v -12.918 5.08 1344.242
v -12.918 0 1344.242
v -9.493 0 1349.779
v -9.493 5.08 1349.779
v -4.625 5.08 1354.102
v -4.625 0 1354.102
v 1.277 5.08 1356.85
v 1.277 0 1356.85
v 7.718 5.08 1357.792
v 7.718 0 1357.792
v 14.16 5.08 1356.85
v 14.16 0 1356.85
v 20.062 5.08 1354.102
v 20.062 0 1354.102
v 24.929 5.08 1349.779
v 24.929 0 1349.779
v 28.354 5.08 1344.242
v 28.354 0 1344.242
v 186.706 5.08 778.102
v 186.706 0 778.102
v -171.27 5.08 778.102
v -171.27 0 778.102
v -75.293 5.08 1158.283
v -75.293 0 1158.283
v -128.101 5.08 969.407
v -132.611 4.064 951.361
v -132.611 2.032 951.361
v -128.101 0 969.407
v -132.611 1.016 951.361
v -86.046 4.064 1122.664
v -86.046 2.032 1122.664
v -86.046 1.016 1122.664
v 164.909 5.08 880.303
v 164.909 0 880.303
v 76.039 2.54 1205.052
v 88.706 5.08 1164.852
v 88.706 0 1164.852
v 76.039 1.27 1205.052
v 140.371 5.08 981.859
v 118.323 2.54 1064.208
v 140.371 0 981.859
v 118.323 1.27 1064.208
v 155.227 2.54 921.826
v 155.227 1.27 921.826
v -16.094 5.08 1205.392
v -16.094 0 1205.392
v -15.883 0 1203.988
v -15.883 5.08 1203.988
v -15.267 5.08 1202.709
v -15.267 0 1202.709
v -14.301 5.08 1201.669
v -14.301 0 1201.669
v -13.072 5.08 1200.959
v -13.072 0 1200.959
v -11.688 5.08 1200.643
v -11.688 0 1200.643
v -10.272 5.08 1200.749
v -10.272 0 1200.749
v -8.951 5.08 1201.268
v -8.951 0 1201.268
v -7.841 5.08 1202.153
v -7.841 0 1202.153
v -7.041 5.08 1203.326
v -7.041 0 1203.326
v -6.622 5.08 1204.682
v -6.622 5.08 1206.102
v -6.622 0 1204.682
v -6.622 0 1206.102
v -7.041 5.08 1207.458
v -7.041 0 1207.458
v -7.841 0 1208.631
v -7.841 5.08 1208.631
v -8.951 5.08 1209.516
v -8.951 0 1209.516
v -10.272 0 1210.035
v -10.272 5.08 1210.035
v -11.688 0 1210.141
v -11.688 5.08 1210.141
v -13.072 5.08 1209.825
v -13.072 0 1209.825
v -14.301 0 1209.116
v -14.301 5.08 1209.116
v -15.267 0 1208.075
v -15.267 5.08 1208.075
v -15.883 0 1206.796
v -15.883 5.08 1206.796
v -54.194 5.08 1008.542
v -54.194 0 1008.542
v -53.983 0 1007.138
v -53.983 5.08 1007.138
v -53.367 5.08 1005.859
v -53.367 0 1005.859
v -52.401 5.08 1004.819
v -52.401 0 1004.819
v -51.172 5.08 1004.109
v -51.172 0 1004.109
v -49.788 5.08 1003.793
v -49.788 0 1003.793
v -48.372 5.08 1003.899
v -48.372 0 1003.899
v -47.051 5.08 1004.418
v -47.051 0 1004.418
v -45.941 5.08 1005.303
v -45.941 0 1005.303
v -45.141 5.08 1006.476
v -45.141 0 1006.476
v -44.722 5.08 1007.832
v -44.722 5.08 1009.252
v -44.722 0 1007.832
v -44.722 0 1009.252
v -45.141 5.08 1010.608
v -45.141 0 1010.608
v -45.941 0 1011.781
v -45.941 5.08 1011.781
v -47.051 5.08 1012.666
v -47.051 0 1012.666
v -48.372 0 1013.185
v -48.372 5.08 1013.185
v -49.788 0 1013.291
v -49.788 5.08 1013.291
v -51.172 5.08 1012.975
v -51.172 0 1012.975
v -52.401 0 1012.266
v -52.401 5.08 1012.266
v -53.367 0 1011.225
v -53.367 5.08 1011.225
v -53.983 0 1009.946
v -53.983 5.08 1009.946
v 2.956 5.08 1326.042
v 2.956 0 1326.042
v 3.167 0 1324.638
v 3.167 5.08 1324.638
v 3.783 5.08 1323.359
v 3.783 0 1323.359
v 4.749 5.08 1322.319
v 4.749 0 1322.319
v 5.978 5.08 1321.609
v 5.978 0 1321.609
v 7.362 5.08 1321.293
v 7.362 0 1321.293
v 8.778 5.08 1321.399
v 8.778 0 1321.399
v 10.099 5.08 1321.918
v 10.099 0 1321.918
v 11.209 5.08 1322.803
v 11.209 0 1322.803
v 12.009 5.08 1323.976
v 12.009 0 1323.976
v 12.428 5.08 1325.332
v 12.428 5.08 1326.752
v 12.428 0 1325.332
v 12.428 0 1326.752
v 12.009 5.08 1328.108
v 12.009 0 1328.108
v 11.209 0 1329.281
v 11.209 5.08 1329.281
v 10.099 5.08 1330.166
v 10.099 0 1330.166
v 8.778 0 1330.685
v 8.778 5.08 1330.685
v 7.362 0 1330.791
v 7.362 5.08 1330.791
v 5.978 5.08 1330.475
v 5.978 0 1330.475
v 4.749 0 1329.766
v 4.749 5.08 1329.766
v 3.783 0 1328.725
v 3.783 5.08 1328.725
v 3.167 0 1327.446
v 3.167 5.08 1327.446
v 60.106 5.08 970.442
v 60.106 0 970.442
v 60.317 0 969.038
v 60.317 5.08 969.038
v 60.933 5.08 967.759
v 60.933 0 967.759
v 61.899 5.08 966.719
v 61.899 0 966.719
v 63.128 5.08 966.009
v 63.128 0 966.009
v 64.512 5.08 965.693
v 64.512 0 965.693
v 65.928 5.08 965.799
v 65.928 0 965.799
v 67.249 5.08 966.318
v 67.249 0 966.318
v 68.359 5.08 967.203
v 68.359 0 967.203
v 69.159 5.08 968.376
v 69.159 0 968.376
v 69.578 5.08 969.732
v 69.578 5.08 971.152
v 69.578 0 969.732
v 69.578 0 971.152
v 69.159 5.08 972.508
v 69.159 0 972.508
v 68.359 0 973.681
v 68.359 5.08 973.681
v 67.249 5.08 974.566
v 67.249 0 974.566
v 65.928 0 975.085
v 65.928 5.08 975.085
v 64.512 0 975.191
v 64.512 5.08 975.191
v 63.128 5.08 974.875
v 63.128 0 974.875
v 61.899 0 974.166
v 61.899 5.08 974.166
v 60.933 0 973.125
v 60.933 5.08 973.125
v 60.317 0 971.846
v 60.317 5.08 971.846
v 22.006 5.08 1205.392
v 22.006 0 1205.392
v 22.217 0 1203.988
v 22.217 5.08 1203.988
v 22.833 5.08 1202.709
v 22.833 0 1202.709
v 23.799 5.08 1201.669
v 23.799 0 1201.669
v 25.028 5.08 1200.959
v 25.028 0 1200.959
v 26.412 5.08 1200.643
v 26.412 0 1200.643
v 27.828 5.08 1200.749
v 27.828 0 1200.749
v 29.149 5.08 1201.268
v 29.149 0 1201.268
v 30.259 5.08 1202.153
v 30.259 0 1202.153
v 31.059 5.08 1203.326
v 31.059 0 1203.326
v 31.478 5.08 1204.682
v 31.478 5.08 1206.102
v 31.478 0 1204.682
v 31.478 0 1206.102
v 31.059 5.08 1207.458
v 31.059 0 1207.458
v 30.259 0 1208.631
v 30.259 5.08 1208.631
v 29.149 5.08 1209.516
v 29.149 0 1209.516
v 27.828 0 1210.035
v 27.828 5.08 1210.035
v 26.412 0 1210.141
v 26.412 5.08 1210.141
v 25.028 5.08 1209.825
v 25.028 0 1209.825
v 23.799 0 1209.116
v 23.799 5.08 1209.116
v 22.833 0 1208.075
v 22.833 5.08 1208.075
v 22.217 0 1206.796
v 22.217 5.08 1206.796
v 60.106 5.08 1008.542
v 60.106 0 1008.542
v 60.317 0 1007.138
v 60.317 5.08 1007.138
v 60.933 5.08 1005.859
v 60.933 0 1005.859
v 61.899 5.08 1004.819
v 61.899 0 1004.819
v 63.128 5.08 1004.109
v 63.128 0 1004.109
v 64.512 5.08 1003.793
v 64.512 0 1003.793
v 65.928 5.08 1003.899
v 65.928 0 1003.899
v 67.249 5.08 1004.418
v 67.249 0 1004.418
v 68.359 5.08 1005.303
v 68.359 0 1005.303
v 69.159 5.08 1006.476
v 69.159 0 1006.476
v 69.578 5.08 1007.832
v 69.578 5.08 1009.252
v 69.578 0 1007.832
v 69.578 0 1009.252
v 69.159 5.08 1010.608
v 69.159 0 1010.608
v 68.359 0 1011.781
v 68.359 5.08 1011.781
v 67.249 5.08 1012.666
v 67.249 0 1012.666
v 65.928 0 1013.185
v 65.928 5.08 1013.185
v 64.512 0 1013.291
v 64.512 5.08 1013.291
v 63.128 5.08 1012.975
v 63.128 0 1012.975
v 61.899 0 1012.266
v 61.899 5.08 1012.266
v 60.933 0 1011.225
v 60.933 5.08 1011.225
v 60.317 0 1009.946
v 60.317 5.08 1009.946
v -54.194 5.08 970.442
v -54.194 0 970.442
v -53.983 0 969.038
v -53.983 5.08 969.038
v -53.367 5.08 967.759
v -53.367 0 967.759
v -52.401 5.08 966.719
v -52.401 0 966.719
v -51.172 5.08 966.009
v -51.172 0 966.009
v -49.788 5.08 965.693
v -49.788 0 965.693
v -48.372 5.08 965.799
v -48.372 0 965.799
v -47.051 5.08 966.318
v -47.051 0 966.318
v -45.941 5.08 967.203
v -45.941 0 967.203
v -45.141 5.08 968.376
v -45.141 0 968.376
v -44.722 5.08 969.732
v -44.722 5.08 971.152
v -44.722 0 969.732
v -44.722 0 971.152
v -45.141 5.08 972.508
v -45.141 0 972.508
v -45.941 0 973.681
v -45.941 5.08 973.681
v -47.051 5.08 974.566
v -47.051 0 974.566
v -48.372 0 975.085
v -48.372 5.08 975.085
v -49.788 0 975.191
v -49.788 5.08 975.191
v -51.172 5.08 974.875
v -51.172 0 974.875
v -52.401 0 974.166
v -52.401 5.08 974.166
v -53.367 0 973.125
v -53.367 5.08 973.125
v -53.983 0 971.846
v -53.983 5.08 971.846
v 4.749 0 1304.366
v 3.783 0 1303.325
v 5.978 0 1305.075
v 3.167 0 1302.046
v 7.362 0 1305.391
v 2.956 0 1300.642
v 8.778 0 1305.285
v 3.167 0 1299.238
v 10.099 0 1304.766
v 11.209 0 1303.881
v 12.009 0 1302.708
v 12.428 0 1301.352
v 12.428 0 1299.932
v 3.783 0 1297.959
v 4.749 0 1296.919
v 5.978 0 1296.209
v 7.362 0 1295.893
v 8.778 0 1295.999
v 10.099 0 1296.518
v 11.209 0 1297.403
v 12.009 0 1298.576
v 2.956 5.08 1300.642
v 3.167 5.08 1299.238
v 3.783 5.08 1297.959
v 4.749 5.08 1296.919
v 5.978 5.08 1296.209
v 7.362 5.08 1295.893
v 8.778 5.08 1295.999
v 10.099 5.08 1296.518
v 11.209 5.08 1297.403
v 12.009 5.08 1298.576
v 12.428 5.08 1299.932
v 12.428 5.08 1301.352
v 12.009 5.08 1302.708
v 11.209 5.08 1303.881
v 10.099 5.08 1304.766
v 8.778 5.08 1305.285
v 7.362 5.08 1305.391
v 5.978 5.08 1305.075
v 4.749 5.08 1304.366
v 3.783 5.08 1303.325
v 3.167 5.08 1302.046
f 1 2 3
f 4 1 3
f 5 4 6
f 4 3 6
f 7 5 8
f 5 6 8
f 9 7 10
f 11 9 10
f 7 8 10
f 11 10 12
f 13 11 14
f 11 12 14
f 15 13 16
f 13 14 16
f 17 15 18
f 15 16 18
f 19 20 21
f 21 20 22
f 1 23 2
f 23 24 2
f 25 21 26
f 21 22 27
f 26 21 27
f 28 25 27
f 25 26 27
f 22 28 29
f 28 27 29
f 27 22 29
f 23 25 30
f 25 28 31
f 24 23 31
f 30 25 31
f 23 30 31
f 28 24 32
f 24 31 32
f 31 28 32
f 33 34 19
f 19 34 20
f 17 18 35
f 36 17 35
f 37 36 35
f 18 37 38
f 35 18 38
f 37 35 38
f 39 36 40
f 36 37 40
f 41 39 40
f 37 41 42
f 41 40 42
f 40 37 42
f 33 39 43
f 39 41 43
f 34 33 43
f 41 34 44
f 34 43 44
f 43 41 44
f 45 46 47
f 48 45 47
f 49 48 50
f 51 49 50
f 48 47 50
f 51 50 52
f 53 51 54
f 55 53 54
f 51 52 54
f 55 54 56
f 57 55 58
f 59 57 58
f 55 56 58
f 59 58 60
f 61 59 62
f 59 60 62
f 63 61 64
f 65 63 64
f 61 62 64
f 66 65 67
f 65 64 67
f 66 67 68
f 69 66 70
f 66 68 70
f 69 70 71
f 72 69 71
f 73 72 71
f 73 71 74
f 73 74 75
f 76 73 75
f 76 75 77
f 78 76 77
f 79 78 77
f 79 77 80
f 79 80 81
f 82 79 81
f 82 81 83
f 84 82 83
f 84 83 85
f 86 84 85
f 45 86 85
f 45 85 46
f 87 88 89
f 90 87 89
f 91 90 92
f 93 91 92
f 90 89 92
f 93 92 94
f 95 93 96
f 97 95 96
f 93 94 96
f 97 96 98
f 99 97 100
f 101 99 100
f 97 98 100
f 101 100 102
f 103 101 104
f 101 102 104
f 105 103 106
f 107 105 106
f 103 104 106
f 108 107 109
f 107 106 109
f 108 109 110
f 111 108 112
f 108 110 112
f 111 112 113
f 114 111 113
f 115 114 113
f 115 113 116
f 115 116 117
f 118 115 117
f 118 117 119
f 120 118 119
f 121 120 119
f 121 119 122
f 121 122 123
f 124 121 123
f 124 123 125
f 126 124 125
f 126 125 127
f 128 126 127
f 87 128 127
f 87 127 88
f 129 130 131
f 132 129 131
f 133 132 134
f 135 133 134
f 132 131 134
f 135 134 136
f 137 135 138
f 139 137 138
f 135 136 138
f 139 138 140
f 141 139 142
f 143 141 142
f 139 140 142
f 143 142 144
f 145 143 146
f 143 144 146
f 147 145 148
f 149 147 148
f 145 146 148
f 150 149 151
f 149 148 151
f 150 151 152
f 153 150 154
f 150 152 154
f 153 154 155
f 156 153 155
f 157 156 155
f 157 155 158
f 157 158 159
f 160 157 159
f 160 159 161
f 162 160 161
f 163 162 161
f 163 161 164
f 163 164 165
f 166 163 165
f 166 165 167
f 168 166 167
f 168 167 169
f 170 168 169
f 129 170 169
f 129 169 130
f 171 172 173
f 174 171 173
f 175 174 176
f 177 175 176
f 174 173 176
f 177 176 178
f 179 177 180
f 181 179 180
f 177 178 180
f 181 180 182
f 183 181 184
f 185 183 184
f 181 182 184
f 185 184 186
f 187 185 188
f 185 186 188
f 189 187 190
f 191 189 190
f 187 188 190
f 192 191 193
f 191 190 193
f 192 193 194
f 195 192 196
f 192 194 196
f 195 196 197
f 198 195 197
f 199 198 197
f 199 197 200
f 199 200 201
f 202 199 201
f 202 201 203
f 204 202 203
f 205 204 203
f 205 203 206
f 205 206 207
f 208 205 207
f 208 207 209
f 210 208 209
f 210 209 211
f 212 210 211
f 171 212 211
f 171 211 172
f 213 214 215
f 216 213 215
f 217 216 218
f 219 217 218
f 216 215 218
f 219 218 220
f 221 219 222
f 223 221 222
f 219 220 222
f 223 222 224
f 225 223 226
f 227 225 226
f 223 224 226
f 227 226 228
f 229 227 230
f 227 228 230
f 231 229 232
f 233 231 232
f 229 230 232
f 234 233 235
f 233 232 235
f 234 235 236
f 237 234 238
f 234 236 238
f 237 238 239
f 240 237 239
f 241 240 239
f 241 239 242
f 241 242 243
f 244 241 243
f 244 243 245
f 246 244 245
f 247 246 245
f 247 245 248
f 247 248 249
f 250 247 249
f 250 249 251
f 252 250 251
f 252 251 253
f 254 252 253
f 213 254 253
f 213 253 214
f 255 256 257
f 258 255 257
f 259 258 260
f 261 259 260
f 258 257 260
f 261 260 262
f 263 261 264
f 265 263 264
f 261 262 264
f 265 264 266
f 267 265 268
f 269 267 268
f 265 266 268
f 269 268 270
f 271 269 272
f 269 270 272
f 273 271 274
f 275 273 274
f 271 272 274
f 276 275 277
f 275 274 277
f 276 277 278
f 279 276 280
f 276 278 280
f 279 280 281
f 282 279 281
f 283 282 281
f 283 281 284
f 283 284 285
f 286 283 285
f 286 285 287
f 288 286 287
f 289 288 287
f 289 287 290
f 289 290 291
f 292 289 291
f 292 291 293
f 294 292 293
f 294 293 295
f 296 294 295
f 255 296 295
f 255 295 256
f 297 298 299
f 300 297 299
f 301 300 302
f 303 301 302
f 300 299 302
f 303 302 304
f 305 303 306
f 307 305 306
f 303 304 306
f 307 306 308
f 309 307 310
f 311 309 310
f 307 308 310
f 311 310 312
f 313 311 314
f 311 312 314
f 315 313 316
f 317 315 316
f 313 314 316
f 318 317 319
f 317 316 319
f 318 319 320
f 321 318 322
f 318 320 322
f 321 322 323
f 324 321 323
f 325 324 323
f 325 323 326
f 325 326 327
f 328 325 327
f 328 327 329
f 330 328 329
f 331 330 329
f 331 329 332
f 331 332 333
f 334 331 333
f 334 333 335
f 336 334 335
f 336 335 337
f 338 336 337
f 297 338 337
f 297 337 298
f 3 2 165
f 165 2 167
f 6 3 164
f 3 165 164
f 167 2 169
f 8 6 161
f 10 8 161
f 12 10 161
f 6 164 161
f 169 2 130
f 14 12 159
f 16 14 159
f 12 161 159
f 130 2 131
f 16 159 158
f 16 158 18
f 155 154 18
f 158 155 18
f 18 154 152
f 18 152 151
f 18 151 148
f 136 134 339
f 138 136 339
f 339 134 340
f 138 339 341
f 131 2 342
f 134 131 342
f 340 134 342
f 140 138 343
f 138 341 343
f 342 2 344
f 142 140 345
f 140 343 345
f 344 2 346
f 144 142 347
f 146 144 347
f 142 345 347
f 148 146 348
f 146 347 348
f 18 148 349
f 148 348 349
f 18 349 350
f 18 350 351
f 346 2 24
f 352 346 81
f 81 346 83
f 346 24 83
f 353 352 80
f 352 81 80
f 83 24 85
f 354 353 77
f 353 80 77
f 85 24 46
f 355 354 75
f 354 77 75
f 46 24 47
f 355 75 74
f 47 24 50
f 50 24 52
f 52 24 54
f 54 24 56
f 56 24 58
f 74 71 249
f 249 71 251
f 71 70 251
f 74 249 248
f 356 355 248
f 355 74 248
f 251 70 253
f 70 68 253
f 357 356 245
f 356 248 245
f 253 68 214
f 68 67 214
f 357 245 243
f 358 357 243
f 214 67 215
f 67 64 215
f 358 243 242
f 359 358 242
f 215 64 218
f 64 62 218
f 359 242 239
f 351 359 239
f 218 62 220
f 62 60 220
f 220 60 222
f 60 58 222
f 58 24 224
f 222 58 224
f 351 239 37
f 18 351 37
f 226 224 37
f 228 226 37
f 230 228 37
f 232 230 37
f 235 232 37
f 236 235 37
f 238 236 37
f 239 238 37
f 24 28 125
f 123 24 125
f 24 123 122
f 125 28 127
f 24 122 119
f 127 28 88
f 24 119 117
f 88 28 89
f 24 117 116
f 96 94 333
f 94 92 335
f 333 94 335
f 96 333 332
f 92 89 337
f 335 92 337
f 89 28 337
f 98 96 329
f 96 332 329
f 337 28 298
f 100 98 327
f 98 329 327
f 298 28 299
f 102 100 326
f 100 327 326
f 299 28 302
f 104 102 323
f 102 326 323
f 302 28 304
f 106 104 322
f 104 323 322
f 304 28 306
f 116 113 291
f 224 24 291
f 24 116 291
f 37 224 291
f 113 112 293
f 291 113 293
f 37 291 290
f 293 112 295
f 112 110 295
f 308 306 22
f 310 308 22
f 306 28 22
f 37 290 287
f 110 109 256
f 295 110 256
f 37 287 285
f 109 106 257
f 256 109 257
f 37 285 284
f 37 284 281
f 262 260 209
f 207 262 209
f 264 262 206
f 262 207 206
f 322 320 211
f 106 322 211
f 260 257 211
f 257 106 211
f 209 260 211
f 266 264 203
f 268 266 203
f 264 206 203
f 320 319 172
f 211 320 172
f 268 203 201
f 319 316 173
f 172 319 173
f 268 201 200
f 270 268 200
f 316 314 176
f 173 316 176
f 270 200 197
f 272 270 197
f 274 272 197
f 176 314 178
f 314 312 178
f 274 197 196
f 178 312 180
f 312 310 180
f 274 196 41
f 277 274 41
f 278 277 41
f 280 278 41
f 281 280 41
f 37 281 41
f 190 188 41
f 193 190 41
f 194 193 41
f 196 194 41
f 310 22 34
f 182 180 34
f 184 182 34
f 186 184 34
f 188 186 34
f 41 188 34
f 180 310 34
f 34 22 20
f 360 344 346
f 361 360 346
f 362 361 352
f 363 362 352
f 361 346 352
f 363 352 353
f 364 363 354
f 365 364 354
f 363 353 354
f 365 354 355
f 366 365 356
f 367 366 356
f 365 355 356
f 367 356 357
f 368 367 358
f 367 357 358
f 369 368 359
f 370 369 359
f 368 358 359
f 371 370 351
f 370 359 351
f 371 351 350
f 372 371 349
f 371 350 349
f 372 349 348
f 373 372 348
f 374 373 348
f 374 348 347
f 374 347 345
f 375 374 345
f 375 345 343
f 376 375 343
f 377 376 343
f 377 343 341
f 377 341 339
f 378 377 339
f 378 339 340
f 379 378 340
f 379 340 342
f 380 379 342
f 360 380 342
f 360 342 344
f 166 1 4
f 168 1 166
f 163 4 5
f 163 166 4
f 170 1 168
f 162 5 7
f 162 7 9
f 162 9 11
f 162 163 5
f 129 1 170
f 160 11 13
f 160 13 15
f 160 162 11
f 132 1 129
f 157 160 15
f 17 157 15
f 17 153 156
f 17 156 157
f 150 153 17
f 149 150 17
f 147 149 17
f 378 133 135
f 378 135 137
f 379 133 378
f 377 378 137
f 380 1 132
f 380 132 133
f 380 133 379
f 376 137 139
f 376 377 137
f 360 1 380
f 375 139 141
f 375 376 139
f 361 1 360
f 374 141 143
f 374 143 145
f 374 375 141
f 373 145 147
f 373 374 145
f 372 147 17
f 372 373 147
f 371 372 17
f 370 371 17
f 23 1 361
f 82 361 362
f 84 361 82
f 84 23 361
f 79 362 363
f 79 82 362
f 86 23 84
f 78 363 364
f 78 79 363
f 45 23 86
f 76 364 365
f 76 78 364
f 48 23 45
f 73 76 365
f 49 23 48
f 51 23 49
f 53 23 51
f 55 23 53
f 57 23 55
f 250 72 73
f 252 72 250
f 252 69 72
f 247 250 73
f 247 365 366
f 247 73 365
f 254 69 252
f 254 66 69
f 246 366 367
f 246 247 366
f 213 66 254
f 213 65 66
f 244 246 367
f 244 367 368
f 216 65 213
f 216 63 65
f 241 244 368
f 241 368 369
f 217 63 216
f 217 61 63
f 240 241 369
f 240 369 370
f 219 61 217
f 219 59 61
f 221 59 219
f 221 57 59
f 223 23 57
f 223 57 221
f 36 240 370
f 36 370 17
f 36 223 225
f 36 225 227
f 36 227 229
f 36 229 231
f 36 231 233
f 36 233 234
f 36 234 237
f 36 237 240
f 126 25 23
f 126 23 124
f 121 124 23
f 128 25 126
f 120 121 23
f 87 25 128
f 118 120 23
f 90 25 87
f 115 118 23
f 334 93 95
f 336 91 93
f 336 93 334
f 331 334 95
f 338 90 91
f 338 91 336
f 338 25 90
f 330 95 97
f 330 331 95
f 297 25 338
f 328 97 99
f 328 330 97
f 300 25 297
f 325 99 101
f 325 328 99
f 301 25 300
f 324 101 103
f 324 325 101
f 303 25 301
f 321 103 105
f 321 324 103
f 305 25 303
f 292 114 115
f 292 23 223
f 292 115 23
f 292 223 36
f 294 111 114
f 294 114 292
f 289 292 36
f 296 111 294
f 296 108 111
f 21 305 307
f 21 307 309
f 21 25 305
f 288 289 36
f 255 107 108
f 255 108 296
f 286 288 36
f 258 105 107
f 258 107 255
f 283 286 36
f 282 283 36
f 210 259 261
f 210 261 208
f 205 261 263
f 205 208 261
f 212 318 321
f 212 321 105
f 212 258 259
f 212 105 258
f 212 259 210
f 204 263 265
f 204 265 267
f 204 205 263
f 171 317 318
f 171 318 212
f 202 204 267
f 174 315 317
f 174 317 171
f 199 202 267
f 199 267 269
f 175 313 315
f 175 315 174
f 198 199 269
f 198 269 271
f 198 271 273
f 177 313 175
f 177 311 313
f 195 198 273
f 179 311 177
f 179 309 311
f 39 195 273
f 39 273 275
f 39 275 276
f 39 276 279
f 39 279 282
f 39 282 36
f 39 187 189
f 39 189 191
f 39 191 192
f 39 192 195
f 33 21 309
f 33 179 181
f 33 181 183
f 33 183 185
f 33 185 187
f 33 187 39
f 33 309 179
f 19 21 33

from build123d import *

# Parameters (mm, degrees)
BOSS_EXTRUDE1_DEPTH          = 5.08
F_3_8_0_375_DIAMETER_HOLE1_D = 9.525
F_3_8_0_375_DIAMETER_HOLE2_D = 9.525


with BuildPart() as part:
    # Sketch1 → Boss-Extrude1 (new body)
    with BuildSketch(Plane(origin=(0, 0, 0), x_dir=(1, 0, 0), z_dir=(0, 1, 0))):
        with BuildLine():
            Line((186.706216966, -778.102360844), (-171.269771153, -778.102360844))
            add(Edge.make_bspline(
                [(-171.269771153, -778.102360844), (-159.707774454, -836.134775395), (-146.81892484, -893.9188082), (-132.611103769, -951.360767835), (-118.403260068, -1008.802818957), (-102.873342202, -1065.933903144), (-86.045569786, -1122.663773012), (-74.990089761, -1159.934062127), (-63.371281317, -1197.041907081), (-51.194215445, -1233.960969312), (-45.100567198, -1252.436009294), (-38.866841431, -1270.865430421), (-32.494599583, -1289.246240662), (-26.120797202, -1307.631552278), (-20.652525047, -1326.386680917), (-12.917829919, -1344.242199148)],
                knots=[0, 0, 0, 0, 0.177518923, 0.177518923, 0.177518923, 0.355038121, 0.355038121, 0.355038121, 0.471646972, 0.471646972, 0.471646972, 0.529995372, 0.529995372, 0.529995372, 0.588358391, 0.588358391, 0.588358391, 0.588358391], degree=3))
            ThreePointArc((-12.917829919, -1344.242199148), (7.718222897, -1357.79203399), (28.354275723, -1344.242199164))
            add(Edge.make_bspline(
                [(28.354275723, -1344.242199164), (38.120725658, -1321.696381858), (44.939237661, -1298.079369173), (60.823654171, -1251.671639351), (68.544496879, -1228.393431097), (91.029194373, -1158.368706478), (105.122355407, -1111.420274649), (144.723795491, -969.782644477), (167.537266257, -874.315888923), (186.706216966, -778.102360844)],
                knots=[0, 0, 0, 0, 0.125, 0.125, 0.25, 0.25, 0.5, 0.5, 1, 1, 1, 1], degree=3))
        make_face()
    extrude(amount=BOSS_EXTRUDE1_DEPTH)

    # 3/8 (0.375) Diameter Hole1 (through all)
    with Locations(Plane(origin=(0, 5.08, 0), x_dir=(1, 0, 0), z_dir=(0, 1, 0))):
        with Locations((7.718222897, -1326.04203399), (7.718222897, -1300.64203399)):
            Hole(F_3_8_0_375_DIAMETER_HOLE1_D / 2)

    # 3/8 (0.375) Diameter Hole2 (through all)
    with Locations(Plane(origin=(0, 5.08, 0), x_dir=(1, 0, 0), z_dir=(0, 1, 0))):
        with Locations((-49.431777094, -970.44203399), (-49.431777094, -1008.54203399), (64.868222906, -970.44203399), (64.868222906, -1008.54203399), (-11.331777094, -1205.39203399), (26.768222906, -1205.39203399)):
            Hole(F_3_8_0_375_DIAMETER_HOLE2_D / 2)


solid = part.part
